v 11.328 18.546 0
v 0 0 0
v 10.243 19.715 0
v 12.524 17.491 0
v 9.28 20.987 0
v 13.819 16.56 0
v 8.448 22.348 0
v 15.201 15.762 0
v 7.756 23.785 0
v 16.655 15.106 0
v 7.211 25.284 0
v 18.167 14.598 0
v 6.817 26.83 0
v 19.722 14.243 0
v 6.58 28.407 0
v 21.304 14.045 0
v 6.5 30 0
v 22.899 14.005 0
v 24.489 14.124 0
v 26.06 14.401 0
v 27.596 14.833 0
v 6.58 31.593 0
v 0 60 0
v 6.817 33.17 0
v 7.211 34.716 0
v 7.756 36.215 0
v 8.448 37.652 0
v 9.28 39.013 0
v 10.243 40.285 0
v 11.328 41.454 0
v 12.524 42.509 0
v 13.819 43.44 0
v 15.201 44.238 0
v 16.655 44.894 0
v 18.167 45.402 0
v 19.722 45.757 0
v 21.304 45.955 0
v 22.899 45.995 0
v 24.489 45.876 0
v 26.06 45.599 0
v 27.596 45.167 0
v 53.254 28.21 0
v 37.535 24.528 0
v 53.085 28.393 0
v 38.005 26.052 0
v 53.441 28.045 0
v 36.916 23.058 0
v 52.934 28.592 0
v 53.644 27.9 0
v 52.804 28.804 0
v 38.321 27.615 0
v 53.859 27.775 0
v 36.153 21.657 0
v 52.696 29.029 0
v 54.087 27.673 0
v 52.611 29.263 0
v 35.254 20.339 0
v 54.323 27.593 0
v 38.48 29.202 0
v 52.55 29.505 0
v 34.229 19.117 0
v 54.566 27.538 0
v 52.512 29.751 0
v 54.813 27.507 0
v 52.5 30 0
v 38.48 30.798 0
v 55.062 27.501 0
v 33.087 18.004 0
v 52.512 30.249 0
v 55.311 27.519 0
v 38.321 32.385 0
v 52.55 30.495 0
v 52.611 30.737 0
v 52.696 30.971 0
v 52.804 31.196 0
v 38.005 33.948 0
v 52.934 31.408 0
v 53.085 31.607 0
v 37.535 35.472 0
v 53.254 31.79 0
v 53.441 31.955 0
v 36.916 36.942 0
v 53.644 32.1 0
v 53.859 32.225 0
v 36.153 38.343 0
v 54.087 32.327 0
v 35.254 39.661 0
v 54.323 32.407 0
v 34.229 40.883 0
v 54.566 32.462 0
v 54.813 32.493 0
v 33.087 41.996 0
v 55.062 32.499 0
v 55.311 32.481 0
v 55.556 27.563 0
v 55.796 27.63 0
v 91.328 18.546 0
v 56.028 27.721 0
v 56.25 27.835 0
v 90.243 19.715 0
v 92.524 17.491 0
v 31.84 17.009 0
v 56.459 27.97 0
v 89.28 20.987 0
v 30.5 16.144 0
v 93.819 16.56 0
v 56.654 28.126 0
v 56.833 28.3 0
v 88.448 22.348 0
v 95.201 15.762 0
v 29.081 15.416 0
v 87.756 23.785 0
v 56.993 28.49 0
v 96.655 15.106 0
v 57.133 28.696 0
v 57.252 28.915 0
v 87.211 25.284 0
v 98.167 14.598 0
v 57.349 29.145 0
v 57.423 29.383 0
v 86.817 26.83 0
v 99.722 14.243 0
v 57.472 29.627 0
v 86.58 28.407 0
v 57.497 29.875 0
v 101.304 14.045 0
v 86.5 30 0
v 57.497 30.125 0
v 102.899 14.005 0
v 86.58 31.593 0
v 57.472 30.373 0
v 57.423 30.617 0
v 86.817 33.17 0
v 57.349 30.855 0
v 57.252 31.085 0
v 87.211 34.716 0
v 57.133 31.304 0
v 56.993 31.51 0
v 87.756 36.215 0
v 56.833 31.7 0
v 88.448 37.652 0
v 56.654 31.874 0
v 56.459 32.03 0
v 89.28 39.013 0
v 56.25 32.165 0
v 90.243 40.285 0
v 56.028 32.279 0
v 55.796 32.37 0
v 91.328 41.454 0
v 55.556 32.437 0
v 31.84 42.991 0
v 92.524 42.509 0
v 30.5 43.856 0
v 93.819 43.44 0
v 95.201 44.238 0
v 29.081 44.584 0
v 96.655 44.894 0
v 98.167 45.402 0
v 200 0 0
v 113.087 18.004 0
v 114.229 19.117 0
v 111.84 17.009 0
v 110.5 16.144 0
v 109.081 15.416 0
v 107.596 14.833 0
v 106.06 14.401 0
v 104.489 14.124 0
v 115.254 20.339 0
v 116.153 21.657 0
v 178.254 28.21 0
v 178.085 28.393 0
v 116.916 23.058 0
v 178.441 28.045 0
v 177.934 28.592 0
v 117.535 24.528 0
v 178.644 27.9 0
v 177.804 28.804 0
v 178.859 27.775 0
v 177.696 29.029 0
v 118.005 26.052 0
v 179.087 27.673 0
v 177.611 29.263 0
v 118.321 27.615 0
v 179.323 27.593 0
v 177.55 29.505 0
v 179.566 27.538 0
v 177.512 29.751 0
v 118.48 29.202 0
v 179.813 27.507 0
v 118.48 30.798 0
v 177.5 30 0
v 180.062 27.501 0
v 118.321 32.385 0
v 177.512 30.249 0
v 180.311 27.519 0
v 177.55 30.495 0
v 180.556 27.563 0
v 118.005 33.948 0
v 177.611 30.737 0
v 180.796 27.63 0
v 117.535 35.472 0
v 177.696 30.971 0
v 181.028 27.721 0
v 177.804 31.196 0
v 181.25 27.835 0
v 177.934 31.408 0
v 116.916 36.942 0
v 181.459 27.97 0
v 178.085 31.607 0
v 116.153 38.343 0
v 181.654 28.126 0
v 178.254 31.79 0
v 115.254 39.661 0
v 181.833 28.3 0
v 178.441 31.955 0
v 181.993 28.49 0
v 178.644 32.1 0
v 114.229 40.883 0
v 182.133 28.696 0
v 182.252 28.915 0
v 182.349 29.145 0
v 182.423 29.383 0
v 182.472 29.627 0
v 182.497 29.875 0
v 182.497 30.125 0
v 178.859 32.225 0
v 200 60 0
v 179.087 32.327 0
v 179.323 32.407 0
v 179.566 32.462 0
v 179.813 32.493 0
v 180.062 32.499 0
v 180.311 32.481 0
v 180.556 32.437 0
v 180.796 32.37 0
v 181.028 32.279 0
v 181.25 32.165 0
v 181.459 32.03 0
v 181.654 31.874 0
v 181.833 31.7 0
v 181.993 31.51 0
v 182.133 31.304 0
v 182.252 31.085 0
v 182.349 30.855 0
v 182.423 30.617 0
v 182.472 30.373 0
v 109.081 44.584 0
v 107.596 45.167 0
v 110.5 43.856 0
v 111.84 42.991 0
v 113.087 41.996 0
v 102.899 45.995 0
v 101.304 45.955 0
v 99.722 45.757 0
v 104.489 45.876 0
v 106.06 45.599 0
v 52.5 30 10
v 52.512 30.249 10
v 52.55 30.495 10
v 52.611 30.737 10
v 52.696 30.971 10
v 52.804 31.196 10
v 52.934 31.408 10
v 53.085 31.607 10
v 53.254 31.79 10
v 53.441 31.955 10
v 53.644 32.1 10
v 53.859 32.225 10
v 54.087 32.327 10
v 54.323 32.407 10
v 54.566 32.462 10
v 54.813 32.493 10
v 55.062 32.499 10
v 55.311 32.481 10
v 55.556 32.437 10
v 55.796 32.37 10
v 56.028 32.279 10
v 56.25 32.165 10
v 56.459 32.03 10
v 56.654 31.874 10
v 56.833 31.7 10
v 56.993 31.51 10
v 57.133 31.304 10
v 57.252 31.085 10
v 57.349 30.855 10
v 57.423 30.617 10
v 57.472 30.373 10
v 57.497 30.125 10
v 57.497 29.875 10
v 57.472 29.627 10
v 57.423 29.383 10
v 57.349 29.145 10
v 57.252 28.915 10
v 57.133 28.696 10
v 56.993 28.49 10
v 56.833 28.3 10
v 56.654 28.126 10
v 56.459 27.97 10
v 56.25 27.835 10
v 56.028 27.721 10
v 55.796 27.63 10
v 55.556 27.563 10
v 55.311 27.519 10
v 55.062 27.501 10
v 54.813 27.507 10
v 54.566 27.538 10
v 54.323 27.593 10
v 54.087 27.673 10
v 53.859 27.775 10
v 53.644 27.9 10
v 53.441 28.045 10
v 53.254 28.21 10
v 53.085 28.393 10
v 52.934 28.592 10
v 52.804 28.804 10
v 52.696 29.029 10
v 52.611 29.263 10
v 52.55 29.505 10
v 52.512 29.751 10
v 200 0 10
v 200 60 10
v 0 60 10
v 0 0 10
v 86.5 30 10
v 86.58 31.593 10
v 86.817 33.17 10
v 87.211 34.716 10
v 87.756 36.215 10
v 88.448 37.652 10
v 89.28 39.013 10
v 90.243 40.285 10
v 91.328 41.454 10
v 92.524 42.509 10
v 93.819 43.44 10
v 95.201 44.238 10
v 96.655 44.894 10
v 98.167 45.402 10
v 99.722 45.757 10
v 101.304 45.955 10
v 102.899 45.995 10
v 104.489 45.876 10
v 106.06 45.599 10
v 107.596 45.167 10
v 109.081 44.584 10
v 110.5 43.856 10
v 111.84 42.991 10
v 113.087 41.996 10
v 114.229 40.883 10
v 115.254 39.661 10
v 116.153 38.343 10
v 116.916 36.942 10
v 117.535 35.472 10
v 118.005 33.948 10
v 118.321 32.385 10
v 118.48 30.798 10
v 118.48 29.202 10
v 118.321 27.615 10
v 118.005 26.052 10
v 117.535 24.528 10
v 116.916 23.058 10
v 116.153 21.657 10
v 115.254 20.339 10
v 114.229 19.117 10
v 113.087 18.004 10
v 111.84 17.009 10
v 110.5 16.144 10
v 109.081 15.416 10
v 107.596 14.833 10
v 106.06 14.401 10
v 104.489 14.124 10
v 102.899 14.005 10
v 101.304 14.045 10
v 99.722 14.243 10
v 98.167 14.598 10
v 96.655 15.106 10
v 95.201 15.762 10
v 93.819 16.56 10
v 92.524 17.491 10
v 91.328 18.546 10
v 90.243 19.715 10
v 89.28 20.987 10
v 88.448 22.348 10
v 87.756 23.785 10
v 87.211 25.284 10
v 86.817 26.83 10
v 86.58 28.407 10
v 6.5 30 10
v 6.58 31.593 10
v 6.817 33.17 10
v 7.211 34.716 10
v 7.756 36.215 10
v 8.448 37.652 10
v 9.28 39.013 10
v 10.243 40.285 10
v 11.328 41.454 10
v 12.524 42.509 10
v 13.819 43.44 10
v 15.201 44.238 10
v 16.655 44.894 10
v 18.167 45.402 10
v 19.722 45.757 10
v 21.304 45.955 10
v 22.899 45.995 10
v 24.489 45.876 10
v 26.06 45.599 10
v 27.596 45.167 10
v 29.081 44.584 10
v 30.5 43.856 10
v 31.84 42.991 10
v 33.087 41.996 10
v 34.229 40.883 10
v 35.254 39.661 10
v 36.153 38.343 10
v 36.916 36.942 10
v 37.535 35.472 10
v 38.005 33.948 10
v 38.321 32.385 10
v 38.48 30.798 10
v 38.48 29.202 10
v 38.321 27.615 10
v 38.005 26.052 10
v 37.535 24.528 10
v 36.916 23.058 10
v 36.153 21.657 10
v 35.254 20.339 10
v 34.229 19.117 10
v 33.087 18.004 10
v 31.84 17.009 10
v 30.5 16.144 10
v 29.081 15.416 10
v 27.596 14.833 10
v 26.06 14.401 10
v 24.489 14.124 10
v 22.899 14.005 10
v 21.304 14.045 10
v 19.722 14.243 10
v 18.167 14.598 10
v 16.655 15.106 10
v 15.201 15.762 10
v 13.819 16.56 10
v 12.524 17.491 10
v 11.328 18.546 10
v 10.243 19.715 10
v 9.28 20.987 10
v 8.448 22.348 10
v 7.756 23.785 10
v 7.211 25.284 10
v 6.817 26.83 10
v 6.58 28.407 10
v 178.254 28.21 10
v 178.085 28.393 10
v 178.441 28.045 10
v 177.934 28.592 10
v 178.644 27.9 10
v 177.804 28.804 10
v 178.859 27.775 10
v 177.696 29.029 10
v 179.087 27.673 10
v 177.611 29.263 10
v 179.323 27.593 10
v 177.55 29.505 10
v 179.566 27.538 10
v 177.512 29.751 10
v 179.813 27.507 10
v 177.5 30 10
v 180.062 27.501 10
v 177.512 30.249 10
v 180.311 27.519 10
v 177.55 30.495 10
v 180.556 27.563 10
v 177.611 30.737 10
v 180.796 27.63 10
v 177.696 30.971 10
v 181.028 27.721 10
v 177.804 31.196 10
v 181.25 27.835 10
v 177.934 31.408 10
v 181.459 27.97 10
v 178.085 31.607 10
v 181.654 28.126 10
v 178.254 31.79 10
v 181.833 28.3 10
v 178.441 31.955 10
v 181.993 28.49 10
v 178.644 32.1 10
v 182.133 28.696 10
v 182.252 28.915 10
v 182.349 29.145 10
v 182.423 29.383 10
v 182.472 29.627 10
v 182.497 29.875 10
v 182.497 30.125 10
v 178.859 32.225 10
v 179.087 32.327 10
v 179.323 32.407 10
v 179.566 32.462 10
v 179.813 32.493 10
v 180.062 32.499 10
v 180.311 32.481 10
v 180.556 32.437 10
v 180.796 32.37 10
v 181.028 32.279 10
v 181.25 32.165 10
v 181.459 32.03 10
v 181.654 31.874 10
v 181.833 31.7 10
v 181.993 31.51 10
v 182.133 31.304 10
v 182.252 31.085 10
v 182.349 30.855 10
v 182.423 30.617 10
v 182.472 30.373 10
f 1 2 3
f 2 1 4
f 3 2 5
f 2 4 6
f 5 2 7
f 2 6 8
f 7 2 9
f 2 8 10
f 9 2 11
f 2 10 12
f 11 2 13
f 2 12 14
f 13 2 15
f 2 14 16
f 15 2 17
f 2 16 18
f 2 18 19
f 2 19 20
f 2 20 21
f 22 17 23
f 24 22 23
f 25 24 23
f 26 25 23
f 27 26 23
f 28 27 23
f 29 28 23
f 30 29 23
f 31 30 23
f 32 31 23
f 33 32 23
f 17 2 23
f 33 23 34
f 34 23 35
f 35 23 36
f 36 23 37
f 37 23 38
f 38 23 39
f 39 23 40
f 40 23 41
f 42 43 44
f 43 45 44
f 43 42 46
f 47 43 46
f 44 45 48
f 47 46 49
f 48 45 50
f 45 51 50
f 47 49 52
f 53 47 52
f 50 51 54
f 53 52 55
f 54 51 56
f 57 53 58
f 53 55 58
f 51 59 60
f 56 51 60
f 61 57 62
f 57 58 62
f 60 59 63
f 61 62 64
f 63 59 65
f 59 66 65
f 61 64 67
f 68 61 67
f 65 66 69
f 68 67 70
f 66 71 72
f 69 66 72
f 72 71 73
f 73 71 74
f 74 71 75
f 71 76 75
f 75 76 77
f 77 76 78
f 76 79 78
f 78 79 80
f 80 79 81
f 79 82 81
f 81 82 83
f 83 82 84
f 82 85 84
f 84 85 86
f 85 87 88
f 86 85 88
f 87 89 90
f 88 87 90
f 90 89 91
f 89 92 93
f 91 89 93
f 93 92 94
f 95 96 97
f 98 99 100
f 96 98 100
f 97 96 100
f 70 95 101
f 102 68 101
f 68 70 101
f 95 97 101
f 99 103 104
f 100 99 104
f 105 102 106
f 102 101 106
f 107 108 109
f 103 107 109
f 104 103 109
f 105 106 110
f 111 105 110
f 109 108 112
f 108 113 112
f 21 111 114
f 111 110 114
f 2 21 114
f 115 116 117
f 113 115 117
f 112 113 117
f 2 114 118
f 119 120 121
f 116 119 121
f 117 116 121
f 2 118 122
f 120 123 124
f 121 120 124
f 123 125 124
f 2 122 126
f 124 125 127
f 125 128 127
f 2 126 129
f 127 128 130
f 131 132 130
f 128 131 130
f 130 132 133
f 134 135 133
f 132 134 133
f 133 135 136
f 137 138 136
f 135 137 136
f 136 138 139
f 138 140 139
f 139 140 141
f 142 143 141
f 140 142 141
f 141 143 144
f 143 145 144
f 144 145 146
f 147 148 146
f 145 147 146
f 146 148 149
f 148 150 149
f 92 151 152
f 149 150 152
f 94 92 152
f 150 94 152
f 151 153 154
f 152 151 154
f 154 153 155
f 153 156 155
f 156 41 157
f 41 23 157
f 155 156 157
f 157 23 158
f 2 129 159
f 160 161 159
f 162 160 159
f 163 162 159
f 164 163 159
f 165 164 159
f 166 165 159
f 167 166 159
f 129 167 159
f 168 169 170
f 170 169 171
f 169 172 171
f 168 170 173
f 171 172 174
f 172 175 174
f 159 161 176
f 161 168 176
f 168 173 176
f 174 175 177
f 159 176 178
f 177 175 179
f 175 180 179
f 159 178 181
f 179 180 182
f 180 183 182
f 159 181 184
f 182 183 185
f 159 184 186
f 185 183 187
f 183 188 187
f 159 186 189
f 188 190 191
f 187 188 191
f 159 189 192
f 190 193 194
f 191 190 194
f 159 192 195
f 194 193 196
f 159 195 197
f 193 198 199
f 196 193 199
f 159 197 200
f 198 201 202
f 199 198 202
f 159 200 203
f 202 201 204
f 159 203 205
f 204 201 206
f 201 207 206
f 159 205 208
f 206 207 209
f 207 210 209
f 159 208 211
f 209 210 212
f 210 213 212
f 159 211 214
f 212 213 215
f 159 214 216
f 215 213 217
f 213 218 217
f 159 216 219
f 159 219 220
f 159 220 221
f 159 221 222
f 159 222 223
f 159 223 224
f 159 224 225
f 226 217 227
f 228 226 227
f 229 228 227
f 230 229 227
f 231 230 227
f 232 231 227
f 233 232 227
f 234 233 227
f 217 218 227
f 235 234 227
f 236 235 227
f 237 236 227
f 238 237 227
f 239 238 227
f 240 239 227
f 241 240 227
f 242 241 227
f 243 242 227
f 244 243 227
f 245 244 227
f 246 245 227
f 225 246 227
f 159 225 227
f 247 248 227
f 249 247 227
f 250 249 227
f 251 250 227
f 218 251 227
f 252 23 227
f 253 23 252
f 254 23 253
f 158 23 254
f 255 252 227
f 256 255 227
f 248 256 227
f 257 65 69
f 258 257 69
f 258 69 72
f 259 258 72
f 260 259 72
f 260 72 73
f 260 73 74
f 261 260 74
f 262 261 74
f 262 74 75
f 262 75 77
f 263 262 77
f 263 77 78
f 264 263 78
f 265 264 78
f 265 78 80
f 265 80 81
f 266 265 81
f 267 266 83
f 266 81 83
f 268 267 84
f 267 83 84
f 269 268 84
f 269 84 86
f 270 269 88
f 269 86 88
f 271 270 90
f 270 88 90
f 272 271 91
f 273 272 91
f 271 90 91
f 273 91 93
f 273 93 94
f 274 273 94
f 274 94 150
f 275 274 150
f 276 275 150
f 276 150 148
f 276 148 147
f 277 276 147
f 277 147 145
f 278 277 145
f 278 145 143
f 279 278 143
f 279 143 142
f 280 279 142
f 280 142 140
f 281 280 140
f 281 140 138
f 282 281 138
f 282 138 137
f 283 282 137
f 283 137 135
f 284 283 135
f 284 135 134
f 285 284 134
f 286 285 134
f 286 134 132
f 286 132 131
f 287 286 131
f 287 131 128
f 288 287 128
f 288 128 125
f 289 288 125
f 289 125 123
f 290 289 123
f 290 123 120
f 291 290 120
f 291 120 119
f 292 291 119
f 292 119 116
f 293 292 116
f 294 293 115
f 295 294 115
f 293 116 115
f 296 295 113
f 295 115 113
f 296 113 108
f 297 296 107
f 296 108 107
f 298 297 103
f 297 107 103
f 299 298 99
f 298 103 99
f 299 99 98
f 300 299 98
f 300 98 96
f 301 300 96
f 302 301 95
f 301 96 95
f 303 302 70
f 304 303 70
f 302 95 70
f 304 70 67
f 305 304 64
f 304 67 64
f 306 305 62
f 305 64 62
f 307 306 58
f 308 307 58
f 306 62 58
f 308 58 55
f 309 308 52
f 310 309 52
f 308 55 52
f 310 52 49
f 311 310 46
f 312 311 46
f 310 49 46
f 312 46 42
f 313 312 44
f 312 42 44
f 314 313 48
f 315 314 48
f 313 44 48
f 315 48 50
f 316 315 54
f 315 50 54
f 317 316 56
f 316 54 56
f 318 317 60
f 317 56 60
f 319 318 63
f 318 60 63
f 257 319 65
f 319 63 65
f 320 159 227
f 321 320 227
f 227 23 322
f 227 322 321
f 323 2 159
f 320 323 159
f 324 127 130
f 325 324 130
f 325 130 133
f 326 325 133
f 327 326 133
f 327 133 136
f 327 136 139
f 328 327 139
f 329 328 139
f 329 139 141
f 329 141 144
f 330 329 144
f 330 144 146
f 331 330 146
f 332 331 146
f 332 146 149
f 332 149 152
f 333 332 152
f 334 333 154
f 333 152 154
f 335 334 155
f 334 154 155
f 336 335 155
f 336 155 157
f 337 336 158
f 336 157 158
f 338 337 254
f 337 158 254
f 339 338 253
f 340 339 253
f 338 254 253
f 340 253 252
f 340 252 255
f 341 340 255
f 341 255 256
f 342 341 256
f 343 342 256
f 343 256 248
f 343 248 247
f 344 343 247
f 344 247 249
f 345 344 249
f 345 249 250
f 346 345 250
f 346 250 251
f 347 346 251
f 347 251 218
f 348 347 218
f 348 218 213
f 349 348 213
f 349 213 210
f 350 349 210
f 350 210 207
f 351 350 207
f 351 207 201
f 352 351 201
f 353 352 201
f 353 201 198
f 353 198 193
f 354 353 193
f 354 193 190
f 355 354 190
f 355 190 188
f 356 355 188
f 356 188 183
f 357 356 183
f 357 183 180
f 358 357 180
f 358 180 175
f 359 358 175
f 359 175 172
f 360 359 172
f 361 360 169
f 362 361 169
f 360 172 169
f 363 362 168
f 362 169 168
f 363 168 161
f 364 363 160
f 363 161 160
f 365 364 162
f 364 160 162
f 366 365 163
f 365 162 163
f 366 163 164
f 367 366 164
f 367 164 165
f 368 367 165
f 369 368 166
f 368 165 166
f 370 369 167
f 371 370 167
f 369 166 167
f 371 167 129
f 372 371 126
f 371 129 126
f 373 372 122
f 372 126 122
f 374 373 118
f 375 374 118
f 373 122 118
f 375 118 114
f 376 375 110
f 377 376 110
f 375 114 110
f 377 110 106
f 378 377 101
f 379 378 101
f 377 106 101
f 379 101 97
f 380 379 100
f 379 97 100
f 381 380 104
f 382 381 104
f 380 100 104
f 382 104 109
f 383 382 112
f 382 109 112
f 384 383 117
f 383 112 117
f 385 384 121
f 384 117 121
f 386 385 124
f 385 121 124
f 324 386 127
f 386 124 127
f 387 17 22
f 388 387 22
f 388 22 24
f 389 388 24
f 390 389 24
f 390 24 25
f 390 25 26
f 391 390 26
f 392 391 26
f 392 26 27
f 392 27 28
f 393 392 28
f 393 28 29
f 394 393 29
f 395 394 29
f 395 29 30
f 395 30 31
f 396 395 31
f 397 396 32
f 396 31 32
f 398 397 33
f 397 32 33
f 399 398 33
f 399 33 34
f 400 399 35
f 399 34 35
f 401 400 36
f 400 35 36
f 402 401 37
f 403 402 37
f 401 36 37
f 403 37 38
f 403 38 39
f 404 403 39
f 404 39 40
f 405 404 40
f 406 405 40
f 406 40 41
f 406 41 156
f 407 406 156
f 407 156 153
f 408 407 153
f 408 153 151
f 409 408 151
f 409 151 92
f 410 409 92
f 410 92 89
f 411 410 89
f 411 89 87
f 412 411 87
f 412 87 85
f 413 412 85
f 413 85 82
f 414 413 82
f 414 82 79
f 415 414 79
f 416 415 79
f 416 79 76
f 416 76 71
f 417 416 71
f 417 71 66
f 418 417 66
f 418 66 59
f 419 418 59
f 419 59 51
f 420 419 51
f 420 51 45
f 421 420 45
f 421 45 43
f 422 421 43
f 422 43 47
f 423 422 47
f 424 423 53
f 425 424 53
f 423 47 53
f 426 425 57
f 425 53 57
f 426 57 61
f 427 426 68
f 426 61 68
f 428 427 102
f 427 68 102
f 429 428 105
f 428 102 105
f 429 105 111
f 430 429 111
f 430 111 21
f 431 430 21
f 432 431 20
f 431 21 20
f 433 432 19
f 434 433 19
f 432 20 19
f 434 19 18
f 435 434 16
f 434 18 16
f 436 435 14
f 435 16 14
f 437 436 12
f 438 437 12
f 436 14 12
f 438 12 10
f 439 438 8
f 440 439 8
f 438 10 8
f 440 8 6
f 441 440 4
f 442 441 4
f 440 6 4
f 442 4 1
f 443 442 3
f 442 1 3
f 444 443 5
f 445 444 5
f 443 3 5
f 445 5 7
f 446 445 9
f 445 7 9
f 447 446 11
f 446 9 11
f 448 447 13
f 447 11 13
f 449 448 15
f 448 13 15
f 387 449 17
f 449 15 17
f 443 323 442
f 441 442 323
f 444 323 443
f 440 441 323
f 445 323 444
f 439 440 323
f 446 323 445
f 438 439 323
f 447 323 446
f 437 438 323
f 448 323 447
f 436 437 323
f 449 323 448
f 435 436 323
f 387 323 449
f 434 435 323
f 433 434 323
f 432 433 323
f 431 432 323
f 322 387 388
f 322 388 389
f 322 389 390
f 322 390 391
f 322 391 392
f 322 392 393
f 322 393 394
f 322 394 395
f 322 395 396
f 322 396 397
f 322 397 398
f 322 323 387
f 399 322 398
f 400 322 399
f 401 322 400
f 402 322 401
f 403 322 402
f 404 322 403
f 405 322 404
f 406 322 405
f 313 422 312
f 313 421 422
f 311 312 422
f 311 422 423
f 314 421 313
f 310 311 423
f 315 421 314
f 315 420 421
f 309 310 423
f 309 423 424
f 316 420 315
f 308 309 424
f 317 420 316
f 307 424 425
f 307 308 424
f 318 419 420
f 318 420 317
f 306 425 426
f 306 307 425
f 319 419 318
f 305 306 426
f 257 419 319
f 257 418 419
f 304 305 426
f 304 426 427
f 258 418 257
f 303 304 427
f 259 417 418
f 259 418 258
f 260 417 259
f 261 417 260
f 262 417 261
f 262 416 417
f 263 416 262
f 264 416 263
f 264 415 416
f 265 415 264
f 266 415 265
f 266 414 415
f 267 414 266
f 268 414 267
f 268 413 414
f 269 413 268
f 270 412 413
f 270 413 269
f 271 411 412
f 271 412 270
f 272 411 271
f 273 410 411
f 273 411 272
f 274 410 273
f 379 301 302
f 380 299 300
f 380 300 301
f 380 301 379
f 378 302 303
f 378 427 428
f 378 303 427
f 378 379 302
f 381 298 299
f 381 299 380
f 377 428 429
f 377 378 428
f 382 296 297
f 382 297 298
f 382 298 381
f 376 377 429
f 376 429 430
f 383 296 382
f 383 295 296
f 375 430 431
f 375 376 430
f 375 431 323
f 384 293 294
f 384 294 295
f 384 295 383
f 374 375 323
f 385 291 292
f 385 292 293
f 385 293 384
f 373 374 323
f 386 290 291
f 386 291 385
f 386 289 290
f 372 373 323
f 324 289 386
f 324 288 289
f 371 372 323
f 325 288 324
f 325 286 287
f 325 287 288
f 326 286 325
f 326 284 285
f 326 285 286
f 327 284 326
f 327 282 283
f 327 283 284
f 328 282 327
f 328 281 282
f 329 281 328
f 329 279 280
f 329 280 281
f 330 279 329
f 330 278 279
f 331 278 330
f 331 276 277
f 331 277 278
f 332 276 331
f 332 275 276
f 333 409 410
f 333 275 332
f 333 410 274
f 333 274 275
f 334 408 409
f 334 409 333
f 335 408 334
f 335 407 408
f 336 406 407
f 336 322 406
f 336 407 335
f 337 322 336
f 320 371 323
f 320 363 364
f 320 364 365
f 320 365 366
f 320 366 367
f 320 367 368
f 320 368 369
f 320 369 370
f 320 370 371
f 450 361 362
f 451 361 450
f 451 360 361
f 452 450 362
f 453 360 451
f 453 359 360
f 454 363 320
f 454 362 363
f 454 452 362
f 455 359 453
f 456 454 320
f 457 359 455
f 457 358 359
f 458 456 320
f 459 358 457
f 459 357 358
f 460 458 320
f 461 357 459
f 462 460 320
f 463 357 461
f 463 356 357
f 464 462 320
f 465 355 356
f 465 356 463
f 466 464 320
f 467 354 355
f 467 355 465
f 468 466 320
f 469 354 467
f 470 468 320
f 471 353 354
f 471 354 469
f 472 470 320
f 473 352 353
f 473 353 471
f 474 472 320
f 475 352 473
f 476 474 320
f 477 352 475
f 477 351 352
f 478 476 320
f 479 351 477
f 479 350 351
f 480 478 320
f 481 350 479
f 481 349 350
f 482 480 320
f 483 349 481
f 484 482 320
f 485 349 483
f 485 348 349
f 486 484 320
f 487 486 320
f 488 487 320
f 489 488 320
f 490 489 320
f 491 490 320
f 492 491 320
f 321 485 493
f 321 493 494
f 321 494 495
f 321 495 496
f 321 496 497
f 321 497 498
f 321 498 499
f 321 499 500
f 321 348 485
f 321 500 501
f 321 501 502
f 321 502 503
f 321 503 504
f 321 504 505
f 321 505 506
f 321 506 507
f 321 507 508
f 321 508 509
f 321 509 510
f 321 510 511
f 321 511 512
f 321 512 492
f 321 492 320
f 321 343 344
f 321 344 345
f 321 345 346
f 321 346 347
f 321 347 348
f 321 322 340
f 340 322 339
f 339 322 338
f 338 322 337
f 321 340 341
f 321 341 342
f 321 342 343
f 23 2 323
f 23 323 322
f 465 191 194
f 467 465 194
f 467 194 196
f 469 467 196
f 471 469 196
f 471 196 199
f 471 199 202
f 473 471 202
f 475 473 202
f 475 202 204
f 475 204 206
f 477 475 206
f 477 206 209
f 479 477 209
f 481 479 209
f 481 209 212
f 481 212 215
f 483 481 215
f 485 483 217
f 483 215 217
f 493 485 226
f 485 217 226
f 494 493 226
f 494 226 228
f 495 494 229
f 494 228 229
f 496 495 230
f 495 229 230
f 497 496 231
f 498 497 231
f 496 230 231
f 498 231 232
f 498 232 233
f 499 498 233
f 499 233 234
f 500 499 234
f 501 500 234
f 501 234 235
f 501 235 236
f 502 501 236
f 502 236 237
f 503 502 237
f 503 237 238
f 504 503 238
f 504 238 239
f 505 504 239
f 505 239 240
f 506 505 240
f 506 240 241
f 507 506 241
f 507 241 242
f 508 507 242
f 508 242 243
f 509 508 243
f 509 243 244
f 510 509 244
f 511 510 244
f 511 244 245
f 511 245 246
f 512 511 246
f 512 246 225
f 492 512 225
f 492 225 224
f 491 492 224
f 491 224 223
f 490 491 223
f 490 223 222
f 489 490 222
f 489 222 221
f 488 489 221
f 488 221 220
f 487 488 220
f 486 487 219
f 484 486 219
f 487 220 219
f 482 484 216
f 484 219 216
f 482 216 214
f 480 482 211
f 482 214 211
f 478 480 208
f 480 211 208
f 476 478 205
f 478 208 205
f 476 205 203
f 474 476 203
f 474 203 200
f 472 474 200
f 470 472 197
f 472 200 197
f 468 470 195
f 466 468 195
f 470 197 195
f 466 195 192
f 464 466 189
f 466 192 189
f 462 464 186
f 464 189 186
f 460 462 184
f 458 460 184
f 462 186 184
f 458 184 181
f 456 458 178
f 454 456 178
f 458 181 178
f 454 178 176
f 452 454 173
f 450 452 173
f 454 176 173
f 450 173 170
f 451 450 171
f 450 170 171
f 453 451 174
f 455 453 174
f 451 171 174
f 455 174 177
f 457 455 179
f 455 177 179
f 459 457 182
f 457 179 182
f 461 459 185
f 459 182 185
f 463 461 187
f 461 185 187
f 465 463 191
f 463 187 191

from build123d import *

# Parameters (mm, degrees)
F0_W     = 200
F0_H     = 60
F1_DEPTH = 10
F3_D     = 32
F5_D     = 5


with BuildPart() as f1:
    # F0 (on Top) → F1 (new body)
    with BuildSketch(Plane.XY):
        with Locations((100, 30)):
            Rectangle(F0_W, F0_H)
    extrude(amount=F1_DEPTH)

    # F3 (through all)
    with Locations(Plane.XY.offset(10)):
        with Locations((102.5, 30), (22.5, 30)):
            Hole(F3_D / 2)

    # F5 (through all)
    with Locations(Plane.XY.offset(10)):
        with Locations((55, 30), (180, 30)):
            Hole(F5_D / 2)


solid = f1.part
